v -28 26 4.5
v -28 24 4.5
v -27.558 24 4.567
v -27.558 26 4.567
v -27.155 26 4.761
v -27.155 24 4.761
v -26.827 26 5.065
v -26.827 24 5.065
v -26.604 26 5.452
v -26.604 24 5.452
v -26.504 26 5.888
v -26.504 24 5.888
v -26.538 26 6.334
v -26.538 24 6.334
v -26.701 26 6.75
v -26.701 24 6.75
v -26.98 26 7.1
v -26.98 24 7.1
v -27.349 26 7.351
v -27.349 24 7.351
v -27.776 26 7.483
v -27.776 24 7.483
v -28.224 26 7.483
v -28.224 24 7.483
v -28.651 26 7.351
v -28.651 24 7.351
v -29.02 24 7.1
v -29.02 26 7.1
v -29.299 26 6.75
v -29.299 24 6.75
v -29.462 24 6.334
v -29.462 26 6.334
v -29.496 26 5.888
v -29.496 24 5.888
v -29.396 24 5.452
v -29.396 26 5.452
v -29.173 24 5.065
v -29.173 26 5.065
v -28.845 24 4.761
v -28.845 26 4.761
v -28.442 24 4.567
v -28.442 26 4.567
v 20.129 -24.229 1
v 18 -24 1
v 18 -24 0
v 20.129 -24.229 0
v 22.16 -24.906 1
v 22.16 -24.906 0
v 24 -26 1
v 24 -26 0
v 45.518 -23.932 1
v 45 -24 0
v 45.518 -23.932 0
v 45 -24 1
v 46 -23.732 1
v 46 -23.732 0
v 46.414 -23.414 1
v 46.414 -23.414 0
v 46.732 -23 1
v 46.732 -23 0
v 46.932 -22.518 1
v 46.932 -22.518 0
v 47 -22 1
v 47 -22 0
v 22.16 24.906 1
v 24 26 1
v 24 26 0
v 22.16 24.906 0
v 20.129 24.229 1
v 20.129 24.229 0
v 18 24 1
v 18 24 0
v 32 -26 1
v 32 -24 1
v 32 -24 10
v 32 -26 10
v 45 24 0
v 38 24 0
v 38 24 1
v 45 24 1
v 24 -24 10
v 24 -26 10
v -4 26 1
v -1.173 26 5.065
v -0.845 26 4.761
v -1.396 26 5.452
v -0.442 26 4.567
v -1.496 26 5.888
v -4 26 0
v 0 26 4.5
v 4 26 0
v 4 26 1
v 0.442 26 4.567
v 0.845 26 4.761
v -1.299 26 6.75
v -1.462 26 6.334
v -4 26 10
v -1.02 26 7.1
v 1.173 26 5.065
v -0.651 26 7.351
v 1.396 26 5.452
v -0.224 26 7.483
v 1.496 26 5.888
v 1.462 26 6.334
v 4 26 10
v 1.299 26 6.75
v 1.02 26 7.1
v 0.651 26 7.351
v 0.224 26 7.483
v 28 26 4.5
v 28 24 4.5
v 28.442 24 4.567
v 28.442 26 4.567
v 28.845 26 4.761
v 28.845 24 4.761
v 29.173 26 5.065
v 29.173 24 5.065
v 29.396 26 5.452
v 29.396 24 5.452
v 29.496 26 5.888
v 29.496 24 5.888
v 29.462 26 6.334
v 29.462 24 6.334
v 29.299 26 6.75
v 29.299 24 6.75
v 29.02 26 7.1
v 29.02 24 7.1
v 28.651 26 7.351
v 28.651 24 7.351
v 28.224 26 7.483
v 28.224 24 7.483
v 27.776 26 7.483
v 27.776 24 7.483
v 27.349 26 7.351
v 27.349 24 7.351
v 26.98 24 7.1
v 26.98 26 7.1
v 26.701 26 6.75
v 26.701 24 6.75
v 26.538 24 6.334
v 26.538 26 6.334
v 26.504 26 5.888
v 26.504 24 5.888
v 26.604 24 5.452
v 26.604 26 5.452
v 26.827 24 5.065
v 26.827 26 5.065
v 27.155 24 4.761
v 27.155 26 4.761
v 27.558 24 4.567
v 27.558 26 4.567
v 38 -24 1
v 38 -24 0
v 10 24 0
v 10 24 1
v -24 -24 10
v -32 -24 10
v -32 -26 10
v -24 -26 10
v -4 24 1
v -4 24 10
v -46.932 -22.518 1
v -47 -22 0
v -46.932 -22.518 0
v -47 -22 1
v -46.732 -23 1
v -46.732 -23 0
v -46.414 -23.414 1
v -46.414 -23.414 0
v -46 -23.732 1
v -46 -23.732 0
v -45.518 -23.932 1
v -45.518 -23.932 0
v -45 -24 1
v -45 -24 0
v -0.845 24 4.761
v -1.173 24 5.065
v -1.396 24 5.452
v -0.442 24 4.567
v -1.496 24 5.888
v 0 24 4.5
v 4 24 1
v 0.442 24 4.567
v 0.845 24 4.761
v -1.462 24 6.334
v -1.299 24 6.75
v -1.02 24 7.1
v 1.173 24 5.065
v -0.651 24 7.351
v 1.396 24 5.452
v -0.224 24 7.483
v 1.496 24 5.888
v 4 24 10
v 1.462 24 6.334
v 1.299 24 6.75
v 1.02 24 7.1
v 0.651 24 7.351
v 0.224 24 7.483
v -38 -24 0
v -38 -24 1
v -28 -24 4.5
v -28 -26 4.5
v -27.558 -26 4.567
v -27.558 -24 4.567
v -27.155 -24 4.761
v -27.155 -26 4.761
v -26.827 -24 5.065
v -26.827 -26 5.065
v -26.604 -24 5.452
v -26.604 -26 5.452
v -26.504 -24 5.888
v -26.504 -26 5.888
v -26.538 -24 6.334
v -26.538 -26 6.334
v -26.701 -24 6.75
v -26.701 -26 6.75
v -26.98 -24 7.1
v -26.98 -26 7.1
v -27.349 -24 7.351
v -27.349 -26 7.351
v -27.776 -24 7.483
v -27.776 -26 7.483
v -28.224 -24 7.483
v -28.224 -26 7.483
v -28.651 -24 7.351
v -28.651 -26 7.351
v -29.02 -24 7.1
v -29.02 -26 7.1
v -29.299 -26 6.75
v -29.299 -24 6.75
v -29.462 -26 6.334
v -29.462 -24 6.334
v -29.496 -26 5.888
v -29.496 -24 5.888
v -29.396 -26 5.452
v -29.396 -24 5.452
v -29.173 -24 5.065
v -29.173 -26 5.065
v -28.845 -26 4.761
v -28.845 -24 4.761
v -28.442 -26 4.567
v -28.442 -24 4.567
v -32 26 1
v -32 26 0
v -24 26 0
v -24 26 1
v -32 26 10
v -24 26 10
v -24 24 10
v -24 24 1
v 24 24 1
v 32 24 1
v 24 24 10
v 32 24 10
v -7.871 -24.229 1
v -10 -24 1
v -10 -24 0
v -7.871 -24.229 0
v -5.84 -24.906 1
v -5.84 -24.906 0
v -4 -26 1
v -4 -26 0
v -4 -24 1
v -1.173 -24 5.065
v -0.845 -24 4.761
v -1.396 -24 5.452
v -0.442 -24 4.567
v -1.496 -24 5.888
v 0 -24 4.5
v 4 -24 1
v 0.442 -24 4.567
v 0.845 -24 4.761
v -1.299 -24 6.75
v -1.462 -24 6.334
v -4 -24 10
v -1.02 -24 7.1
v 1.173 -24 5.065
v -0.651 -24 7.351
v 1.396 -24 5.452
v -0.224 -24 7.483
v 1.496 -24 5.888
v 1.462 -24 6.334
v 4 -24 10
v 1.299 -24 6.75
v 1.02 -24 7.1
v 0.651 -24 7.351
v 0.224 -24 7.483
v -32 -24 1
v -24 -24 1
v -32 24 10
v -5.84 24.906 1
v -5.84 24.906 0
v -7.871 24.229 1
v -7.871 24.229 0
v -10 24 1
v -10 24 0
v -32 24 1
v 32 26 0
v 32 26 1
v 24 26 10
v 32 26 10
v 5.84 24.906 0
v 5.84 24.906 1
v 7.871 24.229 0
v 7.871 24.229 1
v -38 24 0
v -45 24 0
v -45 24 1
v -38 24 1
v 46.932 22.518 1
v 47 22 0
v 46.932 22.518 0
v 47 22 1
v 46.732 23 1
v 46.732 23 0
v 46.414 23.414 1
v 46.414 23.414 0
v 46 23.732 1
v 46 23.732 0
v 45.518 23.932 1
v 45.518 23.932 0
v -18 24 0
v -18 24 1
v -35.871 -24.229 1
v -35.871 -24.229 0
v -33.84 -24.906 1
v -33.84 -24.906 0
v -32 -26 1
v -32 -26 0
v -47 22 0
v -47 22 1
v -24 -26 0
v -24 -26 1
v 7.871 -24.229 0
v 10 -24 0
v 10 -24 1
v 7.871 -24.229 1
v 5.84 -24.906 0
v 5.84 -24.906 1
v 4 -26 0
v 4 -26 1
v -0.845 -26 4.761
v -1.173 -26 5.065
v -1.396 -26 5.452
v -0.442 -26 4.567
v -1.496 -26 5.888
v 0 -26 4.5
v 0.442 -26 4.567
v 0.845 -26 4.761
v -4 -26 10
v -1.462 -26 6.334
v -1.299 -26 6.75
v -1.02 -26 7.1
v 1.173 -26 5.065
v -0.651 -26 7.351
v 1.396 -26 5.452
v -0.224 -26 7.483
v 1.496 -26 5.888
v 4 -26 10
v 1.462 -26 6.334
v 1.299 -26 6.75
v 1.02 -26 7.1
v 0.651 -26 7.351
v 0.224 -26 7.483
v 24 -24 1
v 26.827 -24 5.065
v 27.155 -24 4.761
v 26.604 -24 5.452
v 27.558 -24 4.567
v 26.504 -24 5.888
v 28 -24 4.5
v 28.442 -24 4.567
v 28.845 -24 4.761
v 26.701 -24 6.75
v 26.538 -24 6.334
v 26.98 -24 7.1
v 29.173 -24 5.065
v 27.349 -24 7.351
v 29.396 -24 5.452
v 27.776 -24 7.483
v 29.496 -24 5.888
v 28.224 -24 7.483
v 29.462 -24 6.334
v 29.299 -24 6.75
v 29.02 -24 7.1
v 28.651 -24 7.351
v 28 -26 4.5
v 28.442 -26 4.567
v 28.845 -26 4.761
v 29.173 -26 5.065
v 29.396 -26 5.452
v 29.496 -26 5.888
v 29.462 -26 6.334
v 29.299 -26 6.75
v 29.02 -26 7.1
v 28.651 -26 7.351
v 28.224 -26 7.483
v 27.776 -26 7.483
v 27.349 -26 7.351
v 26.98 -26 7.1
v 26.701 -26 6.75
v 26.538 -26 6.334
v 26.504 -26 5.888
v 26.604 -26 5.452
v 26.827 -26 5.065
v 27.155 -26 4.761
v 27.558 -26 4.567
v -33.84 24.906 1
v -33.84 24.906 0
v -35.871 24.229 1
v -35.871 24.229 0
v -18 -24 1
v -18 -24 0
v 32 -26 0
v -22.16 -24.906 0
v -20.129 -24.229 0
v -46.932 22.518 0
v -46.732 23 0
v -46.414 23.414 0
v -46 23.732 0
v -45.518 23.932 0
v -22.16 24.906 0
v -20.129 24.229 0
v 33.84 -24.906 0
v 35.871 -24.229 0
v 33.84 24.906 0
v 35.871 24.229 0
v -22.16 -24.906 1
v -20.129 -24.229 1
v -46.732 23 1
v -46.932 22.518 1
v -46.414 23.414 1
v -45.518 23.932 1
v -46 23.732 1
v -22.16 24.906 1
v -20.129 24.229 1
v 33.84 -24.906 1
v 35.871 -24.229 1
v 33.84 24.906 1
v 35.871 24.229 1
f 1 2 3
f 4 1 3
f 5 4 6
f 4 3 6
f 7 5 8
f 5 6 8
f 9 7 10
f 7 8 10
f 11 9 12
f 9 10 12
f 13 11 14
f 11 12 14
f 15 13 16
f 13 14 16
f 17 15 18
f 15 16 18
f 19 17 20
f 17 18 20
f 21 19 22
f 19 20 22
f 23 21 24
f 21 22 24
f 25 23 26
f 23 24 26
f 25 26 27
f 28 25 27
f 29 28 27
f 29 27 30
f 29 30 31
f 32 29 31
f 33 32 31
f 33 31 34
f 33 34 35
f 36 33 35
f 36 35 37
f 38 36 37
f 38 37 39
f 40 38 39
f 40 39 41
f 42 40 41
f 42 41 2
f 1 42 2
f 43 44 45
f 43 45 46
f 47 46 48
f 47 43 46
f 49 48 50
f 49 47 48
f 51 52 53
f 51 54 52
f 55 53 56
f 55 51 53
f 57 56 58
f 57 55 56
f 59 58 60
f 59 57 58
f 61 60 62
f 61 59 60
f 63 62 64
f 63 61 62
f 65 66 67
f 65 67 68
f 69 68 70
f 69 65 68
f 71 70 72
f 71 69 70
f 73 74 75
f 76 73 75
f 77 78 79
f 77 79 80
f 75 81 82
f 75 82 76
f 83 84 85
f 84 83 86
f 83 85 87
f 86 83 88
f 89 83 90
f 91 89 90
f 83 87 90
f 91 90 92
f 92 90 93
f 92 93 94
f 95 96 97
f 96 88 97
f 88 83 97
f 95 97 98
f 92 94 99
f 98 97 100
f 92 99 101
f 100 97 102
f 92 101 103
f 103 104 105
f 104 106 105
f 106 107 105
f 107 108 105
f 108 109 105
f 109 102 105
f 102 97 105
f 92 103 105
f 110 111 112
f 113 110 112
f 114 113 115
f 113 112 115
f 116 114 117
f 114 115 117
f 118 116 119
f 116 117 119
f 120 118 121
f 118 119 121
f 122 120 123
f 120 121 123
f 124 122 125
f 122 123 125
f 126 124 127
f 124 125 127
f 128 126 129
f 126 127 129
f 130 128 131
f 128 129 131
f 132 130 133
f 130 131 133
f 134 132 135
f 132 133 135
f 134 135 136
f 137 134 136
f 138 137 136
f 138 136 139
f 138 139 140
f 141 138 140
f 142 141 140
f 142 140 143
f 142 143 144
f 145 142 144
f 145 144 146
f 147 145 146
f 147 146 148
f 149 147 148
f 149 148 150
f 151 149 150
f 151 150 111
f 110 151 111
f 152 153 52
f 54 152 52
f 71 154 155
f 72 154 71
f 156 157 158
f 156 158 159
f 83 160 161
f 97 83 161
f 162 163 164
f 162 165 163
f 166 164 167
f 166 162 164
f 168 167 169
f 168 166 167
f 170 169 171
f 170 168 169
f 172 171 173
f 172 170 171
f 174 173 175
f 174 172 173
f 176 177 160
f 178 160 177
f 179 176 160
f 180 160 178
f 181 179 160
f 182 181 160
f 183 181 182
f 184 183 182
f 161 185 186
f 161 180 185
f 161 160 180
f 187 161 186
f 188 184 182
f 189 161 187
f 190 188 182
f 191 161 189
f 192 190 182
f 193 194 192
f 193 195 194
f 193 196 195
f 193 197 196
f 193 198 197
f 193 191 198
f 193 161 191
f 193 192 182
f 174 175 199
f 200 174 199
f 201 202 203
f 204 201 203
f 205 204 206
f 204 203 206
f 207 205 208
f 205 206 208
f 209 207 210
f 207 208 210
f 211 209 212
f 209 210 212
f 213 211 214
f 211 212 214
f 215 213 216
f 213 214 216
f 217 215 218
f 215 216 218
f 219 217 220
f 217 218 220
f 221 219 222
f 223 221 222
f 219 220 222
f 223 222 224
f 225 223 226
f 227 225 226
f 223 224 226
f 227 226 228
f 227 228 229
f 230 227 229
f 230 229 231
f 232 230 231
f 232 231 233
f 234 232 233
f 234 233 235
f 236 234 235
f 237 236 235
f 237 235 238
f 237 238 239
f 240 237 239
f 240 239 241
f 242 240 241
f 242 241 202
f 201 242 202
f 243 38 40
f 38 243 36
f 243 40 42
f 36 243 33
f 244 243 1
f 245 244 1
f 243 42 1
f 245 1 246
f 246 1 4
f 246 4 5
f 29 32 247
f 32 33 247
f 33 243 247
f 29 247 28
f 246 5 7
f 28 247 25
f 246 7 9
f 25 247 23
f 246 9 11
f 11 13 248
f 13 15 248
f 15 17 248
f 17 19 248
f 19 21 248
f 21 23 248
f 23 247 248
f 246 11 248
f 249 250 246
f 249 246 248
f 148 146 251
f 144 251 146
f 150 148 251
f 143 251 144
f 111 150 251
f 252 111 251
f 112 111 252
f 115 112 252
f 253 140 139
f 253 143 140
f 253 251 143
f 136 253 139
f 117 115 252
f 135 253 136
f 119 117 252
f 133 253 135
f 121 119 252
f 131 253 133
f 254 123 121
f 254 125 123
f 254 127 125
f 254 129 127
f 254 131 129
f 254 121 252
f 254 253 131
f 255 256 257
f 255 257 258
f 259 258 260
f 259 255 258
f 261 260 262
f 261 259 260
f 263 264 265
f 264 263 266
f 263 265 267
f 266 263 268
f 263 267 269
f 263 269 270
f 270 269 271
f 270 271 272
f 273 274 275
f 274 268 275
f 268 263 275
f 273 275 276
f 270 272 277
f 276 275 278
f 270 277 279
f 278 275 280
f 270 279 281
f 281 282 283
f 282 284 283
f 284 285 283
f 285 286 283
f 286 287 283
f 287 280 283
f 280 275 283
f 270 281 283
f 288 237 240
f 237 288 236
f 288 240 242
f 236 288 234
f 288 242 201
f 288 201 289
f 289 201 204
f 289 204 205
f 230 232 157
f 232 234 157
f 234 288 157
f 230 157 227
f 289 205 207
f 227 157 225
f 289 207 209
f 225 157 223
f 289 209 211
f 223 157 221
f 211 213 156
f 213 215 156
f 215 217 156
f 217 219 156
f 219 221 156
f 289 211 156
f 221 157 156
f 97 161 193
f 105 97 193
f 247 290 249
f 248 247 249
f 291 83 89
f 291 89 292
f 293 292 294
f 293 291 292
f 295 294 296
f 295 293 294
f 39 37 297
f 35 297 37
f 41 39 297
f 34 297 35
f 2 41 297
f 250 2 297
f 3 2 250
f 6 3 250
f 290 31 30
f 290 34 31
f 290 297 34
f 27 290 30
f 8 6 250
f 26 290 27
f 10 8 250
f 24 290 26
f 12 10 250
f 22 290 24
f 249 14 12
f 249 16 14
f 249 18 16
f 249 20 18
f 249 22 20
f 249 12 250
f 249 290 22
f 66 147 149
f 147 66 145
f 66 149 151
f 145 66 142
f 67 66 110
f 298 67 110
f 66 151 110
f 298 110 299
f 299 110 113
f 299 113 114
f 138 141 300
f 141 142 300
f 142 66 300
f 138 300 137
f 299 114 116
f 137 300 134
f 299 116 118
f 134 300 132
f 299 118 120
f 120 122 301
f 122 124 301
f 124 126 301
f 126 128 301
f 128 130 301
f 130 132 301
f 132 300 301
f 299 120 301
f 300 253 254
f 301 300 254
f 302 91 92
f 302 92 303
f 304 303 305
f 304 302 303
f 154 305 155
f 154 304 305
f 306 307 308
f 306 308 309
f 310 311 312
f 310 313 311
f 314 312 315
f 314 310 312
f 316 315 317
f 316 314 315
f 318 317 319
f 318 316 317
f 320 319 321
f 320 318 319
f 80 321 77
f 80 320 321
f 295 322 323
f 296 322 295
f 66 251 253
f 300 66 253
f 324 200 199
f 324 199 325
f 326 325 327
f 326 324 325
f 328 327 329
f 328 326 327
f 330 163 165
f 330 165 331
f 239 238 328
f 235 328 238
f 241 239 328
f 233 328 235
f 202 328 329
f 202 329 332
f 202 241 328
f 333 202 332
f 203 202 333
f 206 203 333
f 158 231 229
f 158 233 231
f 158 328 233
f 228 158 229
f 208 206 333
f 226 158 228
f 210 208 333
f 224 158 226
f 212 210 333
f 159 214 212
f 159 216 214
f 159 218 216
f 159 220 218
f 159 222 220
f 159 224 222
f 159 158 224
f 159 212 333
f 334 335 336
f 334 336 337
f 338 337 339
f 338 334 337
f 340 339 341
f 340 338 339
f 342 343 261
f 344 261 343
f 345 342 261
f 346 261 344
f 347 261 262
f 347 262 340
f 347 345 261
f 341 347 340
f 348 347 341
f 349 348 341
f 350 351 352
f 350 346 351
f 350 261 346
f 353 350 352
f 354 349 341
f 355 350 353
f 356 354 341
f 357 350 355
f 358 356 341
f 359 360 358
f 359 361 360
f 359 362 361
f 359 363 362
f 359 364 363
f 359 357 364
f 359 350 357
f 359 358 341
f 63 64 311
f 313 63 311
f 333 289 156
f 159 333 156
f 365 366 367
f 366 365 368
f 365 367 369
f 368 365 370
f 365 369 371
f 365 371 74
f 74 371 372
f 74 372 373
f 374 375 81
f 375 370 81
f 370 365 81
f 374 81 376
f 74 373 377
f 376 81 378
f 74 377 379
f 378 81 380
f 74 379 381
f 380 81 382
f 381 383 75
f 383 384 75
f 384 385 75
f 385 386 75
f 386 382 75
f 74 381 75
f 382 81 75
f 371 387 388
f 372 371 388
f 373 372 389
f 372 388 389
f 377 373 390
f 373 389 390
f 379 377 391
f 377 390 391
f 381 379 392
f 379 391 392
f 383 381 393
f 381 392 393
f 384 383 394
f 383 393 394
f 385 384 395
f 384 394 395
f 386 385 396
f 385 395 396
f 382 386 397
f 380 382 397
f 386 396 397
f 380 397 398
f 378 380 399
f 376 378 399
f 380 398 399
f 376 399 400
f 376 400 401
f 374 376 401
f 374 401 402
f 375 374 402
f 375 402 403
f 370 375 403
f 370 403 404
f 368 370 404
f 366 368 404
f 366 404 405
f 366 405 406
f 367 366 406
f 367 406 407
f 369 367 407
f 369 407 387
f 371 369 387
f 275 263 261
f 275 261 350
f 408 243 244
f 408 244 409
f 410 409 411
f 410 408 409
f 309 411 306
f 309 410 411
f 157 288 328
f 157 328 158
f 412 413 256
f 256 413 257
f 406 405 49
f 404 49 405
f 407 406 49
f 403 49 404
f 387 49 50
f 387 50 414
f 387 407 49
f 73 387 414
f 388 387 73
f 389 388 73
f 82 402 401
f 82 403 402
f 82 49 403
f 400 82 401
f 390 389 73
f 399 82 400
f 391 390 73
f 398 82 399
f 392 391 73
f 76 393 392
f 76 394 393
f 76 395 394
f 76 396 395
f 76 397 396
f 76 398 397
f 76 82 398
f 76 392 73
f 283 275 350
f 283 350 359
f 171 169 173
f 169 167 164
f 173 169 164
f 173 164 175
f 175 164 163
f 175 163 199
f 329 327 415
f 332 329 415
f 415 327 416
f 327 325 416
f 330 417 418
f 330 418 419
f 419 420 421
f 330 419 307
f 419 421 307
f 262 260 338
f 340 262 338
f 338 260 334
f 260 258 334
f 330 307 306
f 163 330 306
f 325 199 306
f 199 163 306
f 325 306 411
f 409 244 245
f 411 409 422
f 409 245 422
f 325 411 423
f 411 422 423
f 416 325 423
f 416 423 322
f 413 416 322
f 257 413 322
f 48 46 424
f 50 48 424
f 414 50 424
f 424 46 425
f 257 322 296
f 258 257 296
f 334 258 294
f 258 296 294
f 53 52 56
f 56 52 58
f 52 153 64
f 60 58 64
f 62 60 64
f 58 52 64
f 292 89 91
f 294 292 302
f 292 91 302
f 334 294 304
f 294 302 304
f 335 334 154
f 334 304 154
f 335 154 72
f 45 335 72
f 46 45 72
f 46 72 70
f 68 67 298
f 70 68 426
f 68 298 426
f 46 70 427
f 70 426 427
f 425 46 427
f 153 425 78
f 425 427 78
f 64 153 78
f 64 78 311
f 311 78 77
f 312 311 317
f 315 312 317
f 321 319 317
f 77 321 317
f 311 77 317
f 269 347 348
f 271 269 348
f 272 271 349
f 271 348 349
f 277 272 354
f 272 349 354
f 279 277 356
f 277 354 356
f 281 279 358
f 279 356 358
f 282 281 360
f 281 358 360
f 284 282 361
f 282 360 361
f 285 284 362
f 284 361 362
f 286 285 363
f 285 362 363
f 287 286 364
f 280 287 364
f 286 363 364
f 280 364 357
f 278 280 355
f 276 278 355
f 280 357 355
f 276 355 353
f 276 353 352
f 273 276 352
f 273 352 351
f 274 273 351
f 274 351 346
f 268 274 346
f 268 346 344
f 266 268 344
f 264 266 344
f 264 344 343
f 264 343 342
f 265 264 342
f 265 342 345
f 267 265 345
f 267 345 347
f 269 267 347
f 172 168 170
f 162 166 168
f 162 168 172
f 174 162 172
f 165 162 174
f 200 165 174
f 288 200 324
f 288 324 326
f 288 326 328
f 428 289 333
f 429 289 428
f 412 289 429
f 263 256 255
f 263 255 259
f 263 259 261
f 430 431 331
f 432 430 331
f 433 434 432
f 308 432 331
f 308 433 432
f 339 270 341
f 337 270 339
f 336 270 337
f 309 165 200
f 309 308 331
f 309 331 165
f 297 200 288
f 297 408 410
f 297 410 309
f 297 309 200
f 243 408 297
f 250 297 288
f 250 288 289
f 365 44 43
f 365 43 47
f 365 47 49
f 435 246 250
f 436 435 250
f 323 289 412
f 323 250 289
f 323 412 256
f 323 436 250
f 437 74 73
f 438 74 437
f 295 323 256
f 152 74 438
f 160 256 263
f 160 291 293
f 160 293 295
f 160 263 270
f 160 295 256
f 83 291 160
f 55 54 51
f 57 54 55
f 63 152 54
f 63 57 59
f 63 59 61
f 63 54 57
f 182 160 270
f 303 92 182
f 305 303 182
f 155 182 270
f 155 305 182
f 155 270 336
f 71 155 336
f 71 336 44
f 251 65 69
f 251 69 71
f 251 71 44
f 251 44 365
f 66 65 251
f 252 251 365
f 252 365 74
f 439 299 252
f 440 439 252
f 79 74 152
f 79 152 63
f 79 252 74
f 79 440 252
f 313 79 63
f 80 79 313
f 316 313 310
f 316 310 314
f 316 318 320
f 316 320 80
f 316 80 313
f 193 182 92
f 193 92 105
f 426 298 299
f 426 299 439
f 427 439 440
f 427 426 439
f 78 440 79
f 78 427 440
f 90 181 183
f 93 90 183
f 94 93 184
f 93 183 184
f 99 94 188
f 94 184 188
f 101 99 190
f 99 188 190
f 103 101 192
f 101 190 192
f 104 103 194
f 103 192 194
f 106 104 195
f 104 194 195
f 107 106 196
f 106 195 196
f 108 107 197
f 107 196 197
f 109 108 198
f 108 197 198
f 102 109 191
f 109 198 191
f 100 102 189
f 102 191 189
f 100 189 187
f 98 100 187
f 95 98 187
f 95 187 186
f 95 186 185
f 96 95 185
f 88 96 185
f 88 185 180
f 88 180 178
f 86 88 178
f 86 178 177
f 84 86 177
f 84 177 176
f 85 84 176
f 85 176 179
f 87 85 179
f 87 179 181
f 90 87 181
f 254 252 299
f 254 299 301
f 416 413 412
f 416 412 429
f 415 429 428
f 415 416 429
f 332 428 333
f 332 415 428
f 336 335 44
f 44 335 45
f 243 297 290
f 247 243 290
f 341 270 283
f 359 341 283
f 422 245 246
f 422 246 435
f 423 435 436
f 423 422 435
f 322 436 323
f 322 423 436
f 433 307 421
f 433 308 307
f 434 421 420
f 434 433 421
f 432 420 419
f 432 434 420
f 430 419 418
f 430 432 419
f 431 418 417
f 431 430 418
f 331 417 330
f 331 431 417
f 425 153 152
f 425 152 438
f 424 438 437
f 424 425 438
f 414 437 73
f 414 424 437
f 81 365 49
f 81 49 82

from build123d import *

# Parameters (mm, degrees)
SKETCH_1_W          = 94
SKETCH_1_H          = 48
EXTRUDE_1_DEPTH     = 1
SKETCH_2_W          = 8
SKETCH_2_H          = 10
EXTRUDE_2_DEPTH     = 2
FILLET_1_R          = 10
SKETCH_3_R          = 1.5
CUT_EXTRUDE_1_DEPTH = 71.802542327
FILLET_2_R          = 2


with BuildPart() as part:
    # Эскиз1 → Бобышка-Вытянуть1 (new body)
    with BuildSketch(Plane.XY):
        Rectangle(SKETCH_1_W, SKETCH_1_H)
    extrude(amount=EXTRUDE_1_DEPTH)

    # Эскиз2 → Бобышка-Вытянуть2 (add)
    with BuildSketch(Plane.XZ.offset(24)):
        with Locations((-28, 5)):
            Rectangle(SKETCH_2_W, SKETCH_2_H)
        with Locations((28, 5)):
            Rectangle(SKETCH_2_W, SKETCH_2_H)
        with Locations((0, 5)):
            Rectangle(SKETCH_2_W, SKETCH_2_H)
    extrude_2 = extrude(amount=EXTRUDE_2_DEPTH)

    # Зеркальное отражение1: Бобышка-Вытянуть2 across plane
    add(extrude_2.mirror(Plane.ZX))

    # Скругление1
    # the kernel refuses this fillet: 10 mm, written as the material it adds along each edge
    with BuildSketch(Plane(origin=(-32, 24, 1), x_dir=(-1, 0, 0), z_dir=(0, 0, -1)), Plane(origin=(-24, 24, 0), x_dir=(1, 0, 0), z_dir=(0, 0, 1)), Plane(origin=(-4, 24, 1), x_dir=(-1, 0, 0), z_dir=(0, 0, -1)), Plane(origin=(4, 24, 0), x_dir=(1, 0, 0), z_dir=(0, 0, 1)), Plane(origin=(24, 24, 1), x_dir=(-1, 0, 0), z_dir=(0, 0, -1)), Plane(origin=(32, 24, 0), x_dir=(1, 0, 0), z_dir=(0, 0, 1))) as fillet_1_piece_1:
        with BuildLine():
            CenterArc((6, 10), FILLET_1_R, 233.130102354, 36.869897646)
            Line((0, 2), (0, 0))
            Line((0, 0), (6, 0))
        make_face()
    extrude(amount=1)
    with BuildSketch(Plane(origin=(32, -24, 0), x_dir=(0, -1, 0), z_dir=(0, 0, 1)), Plane(origin=(4, -24, 0), x_dir=(0, -1, 0), z_dir=(0, 0, 1)), Plane(origin=(-24, -24, 0), x_dir=(0, -1, 0), z_dir=(0, 0, 1))) as fillet_1_piece_2:
        with BuildLine():
            CenterArc((10, 6), FILLET_1_R, 180, 36.869897646)
            Line((0, 6), (0, 0))
            Line((0, 0), (2, 0))
        make_face()
    extrude(amount=1)
    with BuildSketch(Plane(origin=(24, -24, 1), x_dir=(-1, 0, 0), z_dir=(0, 0, -1)), Plane(origin=(-4, -24, 1), x_dir=(-1, 0, 0), z_dir=(0, 0, -1)), Plane(origin=(-32, -24, 1), x_dir=(-1, 0, 0), z_dir=(0, 0, -1))) as fillet_1_piece_3:
        with BuildLine():
            CenterArc((6, -10), FILLET_1_R, 90, 36.869897646)
            Line((0, -2), (0, 0))
            Line((0, 0), (6, 0))
        make_face()
    extrude(amount=1)

    # Эскиз3 → Вырез-Вытянуть1 (cut, through all)
    with BuildSketch(Plane.XZ.offset(26)):
        with Locations(Location((-28, 6, 0), (0, 0, 270))):
            Circle(SKETCH_3_R)
        with Locations(Location((0, 6, 0), (0, 0, 270))):
            Circle(SKETCH_3_R)
        with Locations(Location((28, 6, 0), (0, 0, 270))):
            Circle(SKETCH_3_R)
    extrude(amount=-CUT_EXTRUDE_1_DEPTH, mode=Mode.SUBTRACT)

    # Скругление2
    fillet_2_edges = [part.edges().sort_by_distance(p)[0] for p in [
        (47, -24, 0.5),
        (-47, -24, 0.5),
        (-47, 24, 0.5),
        (47, 24, 0.5),
    ]]
    fillet(fillet_2_edges, radius=FILLET_2_R)


solid = part.part
